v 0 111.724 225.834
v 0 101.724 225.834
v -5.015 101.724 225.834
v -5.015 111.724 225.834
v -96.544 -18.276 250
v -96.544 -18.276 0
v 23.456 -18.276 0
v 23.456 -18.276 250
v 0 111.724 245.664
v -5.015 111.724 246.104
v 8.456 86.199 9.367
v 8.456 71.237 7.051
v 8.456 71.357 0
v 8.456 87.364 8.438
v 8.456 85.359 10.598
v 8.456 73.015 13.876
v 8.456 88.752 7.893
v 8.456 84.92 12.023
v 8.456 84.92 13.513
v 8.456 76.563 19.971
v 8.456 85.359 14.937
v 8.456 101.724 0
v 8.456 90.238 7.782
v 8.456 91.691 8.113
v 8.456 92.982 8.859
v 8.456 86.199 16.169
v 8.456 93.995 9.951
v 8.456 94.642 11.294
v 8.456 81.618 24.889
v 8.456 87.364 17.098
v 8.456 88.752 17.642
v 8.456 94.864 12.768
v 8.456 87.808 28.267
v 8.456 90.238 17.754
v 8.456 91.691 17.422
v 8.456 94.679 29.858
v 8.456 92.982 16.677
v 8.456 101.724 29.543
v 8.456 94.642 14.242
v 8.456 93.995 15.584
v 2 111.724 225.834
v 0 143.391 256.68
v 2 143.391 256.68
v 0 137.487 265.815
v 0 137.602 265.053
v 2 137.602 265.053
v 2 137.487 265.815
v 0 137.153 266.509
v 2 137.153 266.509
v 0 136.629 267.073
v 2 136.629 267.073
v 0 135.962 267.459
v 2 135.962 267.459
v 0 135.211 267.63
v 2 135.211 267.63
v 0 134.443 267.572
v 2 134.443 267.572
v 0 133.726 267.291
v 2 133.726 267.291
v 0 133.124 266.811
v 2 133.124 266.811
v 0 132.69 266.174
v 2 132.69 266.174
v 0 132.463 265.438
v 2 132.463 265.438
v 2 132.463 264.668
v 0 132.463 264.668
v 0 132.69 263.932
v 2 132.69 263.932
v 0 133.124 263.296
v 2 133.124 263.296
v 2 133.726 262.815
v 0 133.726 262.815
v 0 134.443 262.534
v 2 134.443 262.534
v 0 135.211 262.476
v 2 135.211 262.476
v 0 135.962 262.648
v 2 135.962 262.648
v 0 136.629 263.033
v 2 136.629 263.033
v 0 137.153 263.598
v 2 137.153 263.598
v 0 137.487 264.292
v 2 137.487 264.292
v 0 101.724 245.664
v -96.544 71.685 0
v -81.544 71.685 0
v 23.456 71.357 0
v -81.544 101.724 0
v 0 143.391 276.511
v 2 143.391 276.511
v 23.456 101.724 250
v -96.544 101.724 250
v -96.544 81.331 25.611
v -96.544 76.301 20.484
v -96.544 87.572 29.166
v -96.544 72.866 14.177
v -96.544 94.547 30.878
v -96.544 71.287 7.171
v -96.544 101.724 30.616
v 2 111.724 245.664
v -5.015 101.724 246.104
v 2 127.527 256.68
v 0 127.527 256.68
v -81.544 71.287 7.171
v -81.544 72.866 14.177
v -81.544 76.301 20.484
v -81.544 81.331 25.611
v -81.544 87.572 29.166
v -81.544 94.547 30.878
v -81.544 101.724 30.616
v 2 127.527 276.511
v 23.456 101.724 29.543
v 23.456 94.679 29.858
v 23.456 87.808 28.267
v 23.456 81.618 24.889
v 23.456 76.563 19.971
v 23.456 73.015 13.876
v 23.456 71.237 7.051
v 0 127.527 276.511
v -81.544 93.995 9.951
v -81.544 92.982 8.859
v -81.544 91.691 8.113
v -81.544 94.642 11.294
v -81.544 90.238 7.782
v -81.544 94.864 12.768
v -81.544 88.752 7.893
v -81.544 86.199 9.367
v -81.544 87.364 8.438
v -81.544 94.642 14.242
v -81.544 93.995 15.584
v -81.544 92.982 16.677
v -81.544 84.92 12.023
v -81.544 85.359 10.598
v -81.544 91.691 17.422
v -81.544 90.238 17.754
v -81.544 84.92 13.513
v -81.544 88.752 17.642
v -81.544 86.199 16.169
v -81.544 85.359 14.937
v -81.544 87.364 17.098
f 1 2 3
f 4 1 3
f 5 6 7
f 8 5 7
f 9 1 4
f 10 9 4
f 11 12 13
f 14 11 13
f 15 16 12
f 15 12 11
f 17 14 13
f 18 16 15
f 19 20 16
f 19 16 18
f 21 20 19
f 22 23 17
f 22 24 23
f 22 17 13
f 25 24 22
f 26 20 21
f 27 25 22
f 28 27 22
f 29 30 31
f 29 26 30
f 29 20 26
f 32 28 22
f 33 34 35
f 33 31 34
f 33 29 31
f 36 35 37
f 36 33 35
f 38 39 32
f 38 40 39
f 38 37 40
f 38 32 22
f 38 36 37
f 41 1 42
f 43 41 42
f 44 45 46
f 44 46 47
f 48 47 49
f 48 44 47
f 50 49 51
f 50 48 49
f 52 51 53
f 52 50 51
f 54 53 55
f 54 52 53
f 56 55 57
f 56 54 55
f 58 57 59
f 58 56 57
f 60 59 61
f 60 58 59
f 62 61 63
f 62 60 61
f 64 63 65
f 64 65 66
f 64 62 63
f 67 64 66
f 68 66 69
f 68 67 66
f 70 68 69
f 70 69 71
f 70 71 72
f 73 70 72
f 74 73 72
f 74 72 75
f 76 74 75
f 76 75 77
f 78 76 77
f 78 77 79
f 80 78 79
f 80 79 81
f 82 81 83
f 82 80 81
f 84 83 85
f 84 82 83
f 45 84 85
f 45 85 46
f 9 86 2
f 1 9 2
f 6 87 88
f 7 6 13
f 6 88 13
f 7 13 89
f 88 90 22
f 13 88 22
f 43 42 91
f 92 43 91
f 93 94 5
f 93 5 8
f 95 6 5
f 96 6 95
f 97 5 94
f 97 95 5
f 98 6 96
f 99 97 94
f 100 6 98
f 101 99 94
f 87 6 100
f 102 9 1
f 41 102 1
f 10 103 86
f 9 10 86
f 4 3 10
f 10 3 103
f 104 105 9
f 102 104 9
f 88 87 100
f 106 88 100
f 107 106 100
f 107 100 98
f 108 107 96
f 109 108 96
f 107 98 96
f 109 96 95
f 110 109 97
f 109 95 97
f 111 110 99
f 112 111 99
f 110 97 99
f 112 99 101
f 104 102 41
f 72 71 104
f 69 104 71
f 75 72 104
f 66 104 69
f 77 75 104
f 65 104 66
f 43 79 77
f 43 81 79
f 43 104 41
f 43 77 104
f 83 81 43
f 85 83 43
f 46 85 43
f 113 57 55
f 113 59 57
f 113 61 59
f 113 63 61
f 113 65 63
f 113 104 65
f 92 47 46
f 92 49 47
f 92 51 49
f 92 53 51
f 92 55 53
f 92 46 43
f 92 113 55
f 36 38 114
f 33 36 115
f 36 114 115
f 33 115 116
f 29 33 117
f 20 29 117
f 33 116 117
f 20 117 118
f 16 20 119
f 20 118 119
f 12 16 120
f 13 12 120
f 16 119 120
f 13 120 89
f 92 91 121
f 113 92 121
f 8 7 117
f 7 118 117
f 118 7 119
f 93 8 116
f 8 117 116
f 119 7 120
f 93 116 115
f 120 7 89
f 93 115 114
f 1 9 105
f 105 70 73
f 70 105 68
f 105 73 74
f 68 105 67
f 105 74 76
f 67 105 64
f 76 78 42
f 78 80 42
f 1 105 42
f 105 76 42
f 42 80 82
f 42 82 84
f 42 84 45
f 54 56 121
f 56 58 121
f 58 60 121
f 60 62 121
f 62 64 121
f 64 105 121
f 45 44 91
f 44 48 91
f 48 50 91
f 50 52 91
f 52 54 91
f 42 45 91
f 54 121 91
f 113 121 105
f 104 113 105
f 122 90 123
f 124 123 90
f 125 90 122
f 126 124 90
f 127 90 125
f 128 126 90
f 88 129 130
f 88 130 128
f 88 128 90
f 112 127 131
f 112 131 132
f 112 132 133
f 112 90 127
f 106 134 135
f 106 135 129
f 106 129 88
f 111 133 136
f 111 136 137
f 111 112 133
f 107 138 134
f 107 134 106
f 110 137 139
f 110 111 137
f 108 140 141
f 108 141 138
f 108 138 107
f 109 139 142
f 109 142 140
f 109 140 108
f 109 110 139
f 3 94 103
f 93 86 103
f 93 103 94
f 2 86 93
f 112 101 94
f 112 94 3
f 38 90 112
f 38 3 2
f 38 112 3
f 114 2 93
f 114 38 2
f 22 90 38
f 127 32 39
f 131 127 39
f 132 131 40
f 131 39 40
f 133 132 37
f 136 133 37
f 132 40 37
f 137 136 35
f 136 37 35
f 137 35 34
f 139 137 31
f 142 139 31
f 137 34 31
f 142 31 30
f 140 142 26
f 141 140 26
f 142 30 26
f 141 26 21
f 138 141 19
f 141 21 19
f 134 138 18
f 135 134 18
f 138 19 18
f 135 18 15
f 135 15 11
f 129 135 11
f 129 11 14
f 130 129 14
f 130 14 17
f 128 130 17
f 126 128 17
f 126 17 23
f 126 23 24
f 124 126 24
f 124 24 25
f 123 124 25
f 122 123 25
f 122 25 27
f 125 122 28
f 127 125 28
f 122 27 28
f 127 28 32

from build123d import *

# Parameters (mm, degrees)
F0_W      = 120
F0_H      = 120
F1_DEPTH  = 250
F4_DEPTH  = 15
F5_DEPTH  = 15
F6_R      = 5
F7_DEPTH  = 90
F11_DEPTH = 10
F12_R     = 2.5839894192
F13_DEPTH = 2


# Not quite as in the source:
# - the program builds the solid bodies; features that only make, move or delete a surface that nothing else refers to are left out


with BuildPart() as f1:
    # F0 (on Top) → F1 (new body)
    with BuildSketch(Plane.XY):
        with Locations((-36.543828845, 41.7243348807)):
            Rectangle(F0_W, F0_H)
    extrude(amount=F1_DEPTH)

    # F3 (on face) → F4 (cut)
    with BuildSketch(Plane(origin=(-96.543828845, 0, 0), x_dir=(0, -1, 0), z_dir=(-1, 0, 0))):
        with BuildLine():
            Line((-101.7243348807, 0), (-71.6849491, 0))
            ThreePointArc((-71.6849491, 0), (-78.6384158471, 23.222277743), (-101.7243348807, 30.6158713042))
            Line((-101.7243348807, 30.6158713042), (-101.7243348807, 0))
        make_face()
    extrude(amount=-F4_DEPTH, mode=Mode.SUBTRACT)

    # F2 (on face) → F5 (cut)
    with BuildSketch(Plane.YZ.offset(23.456171155)):
        with BuildLine():
            Line((101.7243348807, 0), (101.7243348807, 29.543299228))
            ThreePointArc((101.7243348807, 29.543299228), (78.9226920916, 22.6021851134), (71.3572967199, 0))
            Line((71.3572967199, 0), (101.7243348807, 0))
        make_face()
    extrude(amount=-F5_DEPTH, mode=Mode.SUBTRACT)

    # F6 (on face) → F7 (cut)
    with BuildSketch(Plane.YZ.offset(8.456171155)):
        with Locations((89.8642912507, 12.767852284)):
            Circle(F6_R)
    extrude(amount=-F7_DEPTH, mode=Mode.SUBTRACT)

    # F10 (on face) → F11 (join)
    with BuildSketch(Plane(origin=(0, 101.7243348807, 0), x_dir=(-1, 0, 0), z_dir=(0, 1, 0))):
        Polygon((5.0153527409, 246.1044043303), (0, 245.6637322903), (0, 225.8335798979), (5.0153527409, 225.8335798979), align=None)
    extrude(amount=F11_DEPTH)


with BuildPart() as f13:
    # F12 (on face) → F13 (new body)
    with BuildSketch(Plane.YZ):
        Polygon((111.7243348807, 245.6637322903), (111.7243348807, 225.8335798979), (143.3906257153, 256.6804885864), (143.3906257153, 276.5106260777), (127.5265067816, 276.5106260777), (127.5265067816, 256.6804885864), align=None)
        with Locations((135.017901659, 265.0532126427)):
            Circle(F12_R, mode=Mode.SUBTRACT)
    extrude(amount=F13_DEPTH)


solid = Compound([f1.part, f13.part])
